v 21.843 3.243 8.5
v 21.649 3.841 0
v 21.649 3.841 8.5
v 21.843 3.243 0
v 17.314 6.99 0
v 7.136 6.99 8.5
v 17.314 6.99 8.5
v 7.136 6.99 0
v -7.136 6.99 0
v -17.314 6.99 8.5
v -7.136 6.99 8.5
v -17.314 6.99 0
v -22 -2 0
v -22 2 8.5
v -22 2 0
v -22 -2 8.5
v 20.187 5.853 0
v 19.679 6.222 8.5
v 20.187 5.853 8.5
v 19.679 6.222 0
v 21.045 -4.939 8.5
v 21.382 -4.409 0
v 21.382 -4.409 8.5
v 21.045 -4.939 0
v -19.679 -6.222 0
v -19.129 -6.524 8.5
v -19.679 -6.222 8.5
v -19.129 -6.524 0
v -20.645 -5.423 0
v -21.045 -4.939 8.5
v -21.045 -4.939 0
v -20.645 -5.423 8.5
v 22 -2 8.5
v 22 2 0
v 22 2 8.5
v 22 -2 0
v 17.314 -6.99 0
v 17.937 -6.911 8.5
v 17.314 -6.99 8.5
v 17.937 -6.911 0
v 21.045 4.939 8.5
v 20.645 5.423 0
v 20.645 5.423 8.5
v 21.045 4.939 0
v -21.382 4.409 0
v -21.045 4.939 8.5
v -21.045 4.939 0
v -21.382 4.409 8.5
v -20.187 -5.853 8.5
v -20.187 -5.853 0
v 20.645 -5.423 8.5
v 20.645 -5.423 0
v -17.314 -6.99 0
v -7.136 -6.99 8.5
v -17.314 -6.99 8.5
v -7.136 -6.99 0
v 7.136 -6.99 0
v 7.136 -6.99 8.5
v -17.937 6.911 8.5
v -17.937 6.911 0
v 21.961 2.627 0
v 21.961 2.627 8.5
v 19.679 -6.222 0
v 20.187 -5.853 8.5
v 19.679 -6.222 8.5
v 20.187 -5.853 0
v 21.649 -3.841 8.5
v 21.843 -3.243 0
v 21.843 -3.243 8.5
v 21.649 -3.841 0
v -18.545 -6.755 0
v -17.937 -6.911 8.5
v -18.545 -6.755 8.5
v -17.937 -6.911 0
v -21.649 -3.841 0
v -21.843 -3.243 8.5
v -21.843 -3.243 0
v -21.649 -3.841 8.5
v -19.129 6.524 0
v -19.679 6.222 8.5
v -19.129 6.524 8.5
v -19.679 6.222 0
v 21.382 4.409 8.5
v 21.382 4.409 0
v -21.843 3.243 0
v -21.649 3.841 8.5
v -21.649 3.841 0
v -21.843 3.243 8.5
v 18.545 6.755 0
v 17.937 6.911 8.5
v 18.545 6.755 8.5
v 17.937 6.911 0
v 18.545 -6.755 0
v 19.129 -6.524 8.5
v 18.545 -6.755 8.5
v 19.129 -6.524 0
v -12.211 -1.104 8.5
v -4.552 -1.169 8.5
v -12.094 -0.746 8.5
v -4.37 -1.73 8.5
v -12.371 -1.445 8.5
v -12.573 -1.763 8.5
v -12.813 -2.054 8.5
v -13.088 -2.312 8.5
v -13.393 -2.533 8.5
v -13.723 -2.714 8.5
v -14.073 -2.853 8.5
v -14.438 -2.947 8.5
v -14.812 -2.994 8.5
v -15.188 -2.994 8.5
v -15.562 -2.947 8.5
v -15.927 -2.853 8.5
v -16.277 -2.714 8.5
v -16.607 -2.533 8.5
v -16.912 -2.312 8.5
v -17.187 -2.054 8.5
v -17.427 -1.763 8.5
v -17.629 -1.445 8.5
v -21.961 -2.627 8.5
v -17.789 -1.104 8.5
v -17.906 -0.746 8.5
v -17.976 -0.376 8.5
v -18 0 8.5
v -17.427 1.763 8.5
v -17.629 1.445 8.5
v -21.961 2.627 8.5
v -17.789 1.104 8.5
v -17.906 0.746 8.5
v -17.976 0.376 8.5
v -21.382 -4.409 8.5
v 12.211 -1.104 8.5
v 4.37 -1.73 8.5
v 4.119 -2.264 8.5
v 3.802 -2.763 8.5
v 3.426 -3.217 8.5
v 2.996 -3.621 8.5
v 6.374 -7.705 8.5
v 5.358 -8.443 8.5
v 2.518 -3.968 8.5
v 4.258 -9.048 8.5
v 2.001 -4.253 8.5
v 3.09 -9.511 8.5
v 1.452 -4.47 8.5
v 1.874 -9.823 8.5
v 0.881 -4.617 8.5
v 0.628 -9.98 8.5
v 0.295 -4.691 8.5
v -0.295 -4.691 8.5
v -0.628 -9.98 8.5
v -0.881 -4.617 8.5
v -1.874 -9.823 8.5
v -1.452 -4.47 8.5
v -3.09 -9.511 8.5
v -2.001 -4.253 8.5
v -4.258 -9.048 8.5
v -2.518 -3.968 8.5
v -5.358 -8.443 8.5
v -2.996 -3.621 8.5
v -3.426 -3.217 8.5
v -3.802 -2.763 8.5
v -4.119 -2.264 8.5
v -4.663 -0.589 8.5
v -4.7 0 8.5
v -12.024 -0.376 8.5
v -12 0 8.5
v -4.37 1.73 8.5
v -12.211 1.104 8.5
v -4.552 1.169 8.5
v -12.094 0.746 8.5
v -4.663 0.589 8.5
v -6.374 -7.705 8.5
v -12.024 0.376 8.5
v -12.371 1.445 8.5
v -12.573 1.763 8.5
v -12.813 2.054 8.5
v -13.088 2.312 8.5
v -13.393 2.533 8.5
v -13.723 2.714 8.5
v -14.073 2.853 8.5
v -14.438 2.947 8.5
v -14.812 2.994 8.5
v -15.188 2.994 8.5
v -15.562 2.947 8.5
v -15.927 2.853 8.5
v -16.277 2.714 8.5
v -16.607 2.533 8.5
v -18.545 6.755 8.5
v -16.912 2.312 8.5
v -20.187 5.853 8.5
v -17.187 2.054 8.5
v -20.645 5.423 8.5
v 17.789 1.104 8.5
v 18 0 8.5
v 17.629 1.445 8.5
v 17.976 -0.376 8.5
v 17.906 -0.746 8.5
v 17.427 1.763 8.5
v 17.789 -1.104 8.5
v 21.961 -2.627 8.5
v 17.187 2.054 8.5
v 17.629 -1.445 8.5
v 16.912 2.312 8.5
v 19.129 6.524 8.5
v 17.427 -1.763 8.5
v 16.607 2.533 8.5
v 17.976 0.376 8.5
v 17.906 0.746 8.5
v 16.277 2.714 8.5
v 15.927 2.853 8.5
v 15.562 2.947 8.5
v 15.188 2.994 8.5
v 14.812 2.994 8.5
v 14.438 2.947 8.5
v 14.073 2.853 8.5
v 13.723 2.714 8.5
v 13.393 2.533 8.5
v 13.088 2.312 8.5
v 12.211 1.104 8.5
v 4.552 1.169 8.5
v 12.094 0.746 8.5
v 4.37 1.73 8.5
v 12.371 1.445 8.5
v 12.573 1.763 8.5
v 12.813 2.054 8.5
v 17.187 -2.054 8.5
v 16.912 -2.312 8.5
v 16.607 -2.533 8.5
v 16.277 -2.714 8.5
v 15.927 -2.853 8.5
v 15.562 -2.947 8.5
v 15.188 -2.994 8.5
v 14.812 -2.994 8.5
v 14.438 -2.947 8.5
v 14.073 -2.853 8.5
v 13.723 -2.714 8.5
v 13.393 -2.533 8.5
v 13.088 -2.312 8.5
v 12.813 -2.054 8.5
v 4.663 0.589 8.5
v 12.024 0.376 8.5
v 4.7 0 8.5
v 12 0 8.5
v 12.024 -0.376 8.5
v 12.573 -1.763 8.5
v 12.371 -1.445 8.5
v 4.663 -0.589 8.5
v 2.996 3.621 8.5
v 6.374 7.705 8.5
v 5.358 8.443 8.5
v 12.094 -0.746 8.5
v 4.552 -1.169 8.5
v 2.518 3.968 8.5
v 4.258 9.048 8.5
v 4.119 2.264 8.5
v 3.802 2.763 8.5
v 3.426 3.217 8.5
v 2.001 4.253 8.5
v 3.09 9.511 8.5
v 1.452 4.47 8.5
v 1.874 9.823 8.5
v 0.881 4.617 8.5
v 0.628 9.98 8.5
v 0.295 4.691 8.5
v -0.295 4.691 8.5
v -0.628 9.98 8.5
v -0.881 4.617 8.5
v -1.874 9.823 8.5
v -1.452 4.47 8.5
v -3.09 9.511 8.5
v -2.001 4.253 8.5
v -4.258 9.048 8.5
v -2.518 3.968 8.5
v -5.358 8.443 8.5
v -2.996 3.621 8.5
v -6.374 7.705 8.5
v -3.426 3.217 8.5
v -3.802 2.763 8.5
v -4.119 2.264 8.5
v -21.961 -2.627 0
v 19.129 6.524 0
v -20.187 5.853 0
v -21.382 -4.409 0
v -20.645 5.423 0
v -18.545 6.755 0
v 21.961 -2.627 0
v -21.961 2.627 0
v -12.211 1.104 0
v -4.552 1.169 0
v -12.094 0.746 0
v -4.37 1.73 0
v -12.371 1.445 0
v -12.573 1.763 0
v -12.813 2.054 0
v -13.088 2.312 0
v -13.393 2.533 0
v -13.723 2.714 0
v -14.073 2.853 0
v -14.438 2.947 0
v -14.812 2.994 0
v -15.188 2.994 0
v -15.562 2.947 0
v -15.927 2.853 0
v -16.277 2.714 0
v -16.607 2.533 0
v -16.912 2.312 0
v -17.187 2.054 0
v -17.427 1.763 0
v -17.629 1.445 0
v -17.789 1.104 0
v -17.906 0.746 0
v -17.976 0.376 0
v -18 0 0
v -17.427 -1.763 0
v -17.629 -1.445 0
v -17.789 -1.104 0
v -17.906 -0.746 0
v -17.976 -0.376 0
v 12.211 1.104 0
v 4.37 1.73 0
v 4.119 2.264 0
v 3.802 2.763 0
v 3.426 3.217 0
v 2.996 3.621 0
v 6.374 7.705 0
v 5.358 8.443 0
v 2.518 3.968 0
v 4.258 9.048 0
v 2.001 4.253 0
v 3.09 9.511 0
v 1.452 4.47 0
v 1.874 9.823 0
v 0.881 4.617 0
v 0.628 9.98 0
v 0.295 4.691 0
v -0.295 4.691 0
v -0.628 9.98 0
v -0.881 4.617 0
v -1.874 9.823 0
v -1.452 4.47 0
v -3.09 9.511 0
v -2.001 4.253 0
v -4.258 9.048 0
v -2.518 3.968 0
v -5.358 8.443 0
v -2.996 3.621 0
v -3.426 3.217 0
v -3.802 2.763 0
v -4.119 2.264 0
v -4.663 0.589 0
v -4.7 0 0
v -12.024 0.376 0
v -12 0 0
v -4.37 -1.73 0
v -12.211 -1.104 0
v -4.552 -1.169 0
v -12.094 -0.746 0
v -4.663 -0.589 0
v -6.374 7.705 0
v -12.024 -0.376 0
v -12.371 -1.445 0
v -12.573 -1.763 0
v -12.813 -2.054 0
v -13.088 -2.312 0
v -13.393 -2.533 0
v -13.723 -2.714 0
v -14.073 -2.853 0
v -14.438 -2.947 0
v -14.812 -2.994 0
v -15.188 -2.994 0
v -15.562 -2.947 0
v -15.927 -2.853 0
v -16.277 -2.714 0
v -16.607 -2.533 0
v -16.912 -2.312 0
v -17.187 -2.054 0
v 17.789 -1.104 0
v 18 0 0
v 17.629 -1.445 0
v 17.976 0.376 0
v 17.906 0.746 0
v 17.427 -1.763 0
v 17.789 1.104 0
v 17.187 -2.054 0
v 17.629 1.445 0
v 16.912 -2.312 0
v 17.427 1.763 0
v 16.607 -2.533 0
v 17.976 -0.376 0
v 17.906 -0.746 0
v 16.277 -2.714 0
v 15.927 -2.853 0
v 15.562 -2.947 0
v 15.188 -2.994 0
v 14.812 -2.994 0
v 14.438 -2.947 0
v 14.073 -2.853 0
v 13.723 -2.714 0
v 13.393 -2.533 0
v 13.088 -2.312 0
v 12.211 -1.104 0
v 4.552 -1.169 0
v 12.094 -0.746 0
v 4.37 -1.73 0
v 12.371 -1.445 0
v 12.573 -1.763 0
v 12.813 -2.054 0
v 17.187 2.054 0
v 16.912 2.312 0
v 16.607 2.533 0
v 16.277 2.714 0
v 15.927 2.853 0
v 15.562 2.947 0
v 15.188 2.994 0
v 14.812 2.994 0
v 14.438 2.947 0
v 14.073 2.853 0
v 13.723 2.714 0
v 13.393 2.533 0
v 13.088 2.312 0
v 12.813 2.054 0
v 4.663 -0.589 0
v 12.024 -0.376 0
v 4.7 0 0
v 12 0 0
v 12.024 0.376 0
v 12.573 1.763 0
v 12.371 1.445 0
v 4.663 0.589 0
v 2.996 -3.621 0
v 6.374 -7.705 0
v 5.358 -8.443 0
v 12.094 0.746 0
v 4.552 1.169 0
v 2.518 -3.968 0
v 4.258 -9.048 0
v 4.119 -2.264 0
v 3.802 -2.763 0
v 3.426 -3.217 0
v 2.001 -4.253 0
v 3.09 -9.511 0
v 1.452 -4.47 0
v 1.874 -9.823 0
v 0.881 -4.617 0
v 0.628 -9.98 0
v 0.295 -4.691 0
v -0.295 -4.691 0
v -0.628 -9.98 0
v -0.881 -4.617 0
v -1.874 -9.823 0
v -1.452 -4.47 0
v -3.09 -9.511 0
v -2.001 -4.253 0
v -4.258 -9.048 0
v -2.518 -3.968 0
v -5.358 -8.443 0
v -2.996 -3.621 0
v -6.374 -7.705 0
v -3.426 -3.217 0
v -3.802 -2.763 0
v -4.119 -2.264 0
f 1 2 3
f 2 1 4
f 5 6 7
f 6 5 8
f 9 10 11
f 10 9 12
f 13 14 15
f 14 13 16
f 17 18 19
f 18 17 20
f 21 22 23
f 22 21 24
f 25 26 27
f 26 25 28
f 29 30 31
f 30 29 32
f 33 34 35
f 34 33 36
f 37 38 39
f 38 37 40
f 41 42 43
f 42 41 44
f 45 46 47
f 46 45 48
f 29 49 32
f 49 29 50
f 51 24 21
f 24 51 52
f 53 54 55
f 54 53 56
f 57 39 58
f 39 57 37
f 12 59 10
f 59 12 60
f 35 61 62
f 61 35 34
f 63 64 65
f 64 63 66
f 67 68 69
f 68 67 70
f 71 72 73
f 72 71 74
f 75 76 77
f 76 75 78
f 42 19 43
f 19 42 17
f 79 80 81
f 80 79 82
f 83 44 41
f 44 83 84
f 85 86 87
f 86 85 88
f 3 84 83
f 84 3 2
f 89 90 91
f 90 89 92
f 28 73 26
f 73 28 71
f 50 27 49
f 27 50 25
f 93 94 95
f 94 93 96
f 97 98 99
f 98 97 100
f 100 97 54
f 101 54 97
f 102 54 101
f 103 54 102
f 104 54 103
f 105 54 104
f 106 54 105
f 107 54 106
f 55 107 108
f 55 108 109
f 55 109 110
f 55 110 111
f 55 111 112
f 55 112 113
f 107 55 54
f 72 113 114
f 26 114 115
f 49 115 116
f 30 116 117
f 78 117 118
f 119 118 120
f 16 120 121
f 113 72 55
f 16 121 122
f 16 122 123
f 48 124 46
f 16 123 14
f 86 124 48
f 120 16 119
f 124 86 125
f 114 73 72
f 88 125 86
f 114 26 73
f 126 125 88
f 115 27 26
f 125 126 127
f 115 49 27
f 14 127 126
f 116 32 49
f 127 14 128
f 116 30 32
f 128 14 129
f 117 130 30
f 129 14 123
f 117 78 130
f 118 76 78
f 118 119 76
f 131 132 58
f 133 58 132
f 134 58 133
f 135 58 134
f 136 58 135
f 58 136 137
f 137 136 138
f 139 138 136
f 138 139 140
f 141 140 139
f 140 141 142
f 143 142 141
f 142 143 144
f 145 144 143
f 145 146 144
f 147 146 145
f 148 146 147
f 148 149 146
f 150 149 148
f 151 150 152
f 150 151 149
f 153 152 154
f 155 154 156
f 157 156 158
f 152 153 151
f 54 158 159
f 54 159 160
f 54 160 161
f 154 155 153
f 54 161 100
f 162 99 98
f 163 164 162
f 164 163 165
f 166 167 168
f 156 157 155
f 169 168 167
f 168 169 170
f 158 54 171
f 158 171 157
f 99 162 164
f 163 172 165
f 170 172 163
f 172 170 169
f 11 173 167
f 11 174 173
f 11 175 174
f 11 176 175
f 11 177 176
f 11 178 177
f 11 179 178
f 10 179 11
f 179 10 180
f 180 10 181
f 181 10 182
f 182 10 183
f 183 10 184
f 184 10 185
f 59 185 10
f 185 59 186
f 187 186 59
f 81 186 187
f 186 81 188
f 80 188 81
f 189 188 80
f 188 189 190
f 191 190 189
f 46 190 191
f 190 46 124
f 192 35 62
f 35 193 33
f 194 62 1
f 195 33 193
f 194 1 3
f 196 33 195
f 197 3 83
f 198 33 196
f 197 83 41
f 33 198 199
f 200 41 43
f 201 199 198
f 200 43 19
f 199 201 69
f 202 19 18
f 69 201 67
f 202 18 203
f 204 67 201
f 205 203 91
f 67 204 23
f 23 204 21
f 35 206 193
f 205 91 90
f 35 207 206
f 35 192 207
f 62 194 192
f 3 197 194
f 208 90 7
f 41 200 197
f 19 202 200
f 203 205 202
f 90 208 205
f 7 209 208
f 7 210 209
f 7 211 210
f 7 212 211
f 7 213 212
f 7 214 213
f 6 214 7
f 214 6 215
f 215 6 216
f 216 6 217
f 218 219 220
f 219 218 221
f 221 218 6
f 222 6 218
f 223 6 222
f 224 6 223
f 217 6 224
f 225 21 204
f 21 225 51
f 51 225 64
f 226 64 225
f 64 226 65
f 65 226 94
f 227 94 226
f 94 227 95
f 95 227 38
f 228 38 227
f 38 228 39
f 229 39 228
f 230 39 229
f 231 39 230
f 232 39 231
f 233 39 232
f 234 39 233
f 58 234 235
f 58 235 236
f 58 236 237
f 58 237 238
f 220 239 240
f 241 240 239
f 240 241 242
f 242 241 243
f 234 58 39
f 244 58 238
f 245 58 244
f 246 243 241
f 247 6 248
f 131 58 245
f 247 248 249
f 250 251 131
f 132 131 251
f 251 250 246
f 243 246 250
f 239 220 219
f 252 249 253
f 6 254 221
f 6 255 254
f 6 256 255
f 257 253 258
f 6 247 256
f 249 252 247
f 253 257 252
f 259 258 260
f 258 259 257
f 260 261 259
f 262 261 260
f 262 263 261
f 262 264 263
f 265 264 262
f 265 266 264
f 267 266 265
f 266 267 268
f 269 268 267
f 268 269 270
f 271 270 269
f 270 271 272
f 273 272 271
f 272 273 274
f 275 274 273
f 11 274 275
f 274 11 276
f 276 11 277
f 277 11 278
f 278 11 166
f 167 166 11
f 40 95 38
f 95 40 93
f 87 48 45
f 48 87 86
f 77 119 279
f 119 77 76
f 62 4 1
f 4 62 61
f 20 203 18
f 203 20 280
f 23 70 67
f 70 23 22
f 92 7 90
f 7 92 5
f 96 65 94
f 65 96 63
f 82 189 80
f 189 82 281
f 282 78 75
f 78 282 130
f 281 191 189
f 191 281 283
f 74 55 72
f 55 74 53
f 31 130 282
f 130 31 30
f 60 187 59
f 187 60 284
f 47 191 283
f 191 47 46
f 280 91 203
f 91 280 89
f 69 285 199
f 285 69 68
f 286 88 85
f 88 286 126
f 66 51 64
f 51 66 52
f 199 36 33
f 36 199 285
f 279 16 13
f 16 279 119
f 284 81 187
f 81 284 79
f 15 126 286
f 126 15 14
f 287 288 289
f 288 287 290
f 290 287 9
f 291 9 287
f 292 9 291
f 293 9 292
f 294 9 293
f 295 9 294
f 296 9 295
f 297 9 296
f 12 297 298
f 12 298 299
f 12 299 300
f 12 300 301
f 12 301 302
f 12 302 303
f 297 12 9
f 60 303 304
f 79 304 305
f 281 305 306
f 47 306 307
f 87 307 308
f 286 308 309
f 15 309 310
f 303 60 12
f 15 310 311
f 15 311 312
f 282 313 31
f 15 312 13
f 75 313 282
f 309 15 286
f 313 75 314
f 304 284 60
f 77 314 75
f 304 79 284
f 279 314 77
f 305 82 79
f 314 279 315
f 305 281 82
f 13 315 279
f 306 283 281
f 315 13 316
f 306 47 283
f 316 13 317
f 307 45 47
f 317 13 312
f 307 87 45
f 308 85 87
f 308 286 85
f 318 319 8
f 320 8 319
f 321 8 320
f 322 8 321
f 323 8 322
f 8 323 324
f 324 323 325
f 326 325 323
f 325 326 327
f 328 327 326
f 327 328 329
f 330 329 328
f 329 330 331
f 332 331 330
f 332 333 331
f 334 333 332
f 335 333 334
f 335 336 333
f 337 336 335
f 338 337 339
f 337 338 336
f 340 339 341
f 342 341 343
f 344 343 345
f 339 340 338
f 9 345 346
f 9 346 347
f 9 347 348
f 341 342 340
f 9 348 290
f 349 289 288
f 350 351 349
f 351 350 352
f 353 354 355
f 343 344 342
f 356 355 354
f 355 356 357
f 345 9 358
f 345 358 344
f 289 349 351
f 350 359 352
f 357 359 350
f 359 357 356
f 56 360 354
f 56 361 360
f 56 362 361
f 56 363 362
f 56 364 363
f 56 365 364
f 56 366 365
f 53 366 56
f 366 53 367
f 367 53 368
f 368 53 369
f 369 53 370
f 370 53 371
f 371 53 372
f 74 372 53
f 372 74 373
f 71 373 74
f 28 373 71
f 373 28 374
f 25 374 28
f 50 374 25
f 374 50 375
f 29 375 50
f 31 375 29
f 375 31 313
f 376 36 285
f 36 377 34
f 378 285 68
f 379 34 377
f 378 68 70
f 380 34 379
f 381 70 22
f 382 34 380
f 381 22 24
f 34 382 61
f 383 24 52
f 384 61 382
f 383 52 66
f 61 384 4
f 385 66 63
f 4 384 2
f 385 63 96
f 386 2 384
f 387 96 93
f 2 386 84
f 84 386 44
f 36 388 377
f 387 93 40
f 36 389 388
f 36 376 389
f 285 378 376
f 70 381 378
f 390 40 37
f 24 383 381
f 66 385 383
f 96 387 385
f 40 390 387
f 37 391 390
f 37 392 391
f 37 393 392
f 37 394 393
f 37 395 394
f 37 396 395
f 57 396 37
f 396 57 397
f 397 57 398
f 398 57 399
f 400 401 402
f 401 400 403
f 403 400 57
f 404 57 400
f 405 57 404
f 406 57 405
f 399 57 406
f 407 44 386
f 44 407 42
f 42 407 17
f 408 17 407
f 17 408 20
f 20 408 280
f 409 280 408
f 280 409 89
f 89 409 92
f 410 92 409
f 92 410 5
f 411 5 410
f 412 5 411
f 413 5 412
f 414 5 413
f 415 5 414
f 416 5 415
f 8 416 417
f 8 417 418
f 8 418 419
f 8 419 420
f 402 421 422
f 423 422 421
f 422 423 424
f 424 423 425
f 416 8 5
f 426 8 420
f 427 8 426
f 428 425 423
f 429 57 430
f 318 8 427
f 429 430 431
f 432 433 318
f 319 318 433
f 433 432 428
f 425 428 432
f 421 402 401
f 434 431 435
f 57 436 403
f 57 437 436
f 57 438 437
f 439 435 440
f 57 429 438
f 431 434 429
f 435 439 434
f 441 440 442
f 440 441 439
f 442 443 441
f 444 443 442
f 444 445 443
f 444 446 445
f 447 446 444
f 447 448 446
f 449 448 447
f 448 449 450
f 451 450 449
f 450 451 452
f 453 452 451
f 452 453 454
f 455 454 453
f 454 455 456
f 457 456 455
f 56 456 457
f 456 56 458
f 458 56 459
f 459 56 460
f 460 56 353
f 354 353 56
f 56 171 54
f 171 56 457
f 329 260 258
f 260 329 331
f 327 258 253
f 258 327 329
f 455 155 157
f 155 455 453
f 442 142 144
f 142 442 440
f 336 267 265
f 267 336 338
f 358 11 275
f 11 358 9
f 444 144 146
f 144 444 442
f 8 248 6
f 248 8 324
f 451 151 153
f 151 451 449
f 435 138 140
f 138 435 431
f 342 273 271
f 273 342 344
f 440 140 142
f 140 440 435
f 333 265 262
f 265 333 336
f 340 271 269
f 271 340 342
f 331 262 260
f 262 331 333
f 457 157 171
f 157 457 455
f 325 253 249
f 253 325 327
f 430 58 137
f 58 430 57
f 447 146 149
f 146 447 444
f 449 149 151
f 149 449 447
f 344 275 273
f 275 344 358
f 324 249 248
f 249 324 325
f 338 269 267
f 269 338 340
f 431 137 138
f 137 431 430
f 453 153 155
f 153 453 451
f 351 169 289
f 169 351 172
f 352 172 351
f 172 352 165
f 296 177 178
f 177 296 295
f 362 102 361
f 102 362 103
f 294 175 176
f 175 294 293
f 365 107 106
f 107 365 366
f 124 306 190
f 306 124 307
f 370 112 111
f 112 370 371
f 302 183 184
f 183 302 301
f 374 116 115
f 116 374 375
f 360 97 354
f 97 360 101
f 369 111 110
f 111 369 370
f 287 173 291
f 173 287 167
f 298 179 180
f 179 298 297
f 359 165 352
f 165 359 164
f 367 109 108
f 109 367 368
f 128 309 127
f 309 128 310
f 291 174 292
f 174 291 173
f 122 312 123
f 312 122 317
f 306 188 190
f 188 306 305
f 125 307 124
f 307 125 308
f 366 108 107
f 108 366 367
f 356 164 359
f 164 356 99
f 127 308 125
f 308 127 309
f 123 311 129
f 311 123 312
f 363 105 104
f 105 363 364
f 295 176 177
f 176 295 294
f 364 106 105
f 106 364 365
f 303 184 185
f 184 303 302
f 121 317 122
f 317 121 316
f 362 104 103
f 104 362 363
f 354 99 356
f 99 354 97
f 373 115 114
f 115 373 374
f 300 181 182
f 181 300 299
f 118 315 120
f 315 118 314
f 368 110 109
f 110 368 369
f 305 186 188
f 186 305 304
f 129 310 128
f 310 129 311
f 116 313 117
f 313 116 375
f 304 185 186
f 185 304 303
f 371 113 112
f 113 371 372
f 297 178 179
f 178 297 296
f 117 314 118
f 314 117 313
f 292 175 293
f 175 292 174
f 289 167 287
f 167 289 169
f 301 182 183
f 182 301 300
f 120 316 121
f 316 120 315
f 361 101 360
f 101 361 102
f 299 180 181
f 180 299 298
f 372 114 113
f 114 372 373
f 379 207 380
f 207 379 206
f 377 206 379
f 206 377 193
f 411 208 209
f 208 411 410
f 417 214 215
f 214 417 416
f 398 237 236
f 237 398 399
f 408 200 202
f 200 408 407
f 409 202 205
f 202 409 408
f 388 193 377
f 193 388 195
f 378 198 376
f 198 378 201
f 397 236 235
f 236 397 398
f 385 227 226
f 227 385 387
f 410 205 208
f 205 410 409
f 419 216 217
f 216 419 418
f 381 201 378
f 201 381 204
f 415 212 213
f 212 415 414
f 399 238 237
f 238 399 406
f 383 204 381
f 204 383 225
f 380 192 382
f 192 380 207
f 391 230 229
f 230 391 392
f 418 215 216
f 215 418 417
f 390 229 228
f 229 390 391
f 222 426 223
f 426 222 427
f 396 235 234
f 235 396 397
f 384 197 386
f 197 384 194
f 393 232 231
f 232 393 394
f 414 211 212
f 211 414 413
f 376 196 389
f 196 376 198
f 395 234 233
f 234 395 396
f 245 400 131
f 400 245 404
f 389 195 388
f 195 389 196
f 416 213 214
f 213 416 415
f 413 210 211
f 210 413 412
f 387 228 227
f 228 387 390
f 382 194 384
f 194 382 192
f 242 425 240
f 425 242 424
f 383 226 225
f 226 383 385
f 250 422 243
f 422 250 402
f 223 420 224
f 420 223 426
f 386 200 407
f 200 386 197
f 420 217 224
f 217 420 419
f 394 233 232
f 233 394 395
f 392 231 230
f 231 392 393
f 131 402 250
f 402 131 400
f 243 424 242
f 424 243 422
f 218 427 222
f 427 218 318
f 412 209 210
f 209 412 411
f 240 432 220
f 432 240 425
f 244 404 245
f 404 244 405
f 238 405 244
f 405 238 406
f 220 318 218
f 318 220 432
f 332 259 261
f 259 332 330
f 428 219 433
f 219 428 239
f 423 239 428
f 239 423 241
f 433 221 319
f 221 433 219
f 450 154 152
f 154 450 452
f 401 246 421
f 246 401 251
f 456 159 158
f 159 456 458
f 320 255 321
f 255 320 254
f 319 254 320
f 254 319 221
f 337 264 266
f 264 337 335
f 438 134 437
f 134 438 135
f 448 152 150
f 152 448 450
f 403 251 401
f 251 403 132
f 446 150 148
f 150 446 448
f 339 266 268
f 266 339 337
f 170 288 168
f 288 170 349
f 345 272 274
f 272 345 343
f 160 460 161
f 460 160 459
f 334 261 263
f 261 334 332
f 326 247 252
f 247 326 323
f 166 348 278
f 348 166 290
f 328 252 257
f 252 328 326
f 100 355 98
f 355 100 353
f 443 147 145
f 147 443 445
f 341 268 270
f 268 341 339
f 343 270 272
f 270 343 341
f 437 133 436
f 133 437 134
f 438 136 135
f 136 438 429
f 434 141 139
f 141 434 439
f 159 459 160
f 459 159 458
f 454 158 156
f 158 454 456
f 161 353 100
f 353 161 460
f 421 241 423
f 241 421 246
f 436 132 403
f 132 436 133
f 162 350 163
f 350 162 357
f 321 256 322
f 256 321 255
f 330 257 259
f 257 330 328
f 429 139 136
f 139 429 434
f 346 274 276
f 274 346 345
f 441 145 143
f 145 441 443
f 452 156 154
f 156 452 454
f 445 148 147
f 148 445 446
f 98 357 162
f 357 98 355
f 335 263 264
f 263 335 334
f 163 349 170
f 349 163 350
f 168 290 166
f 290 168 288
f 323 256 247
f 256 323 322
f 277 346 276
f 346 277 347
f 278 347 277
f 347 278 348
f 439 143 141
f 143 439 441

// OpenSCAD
$fn = 50;


difference() {
	union() {
		translate(v = [0, 0, 0]) {
			rotate(a = [0, 0, 0]) {
				hull() {
					translate(v = [-17.0000000000, 2.0000000000, 0]) {
						rotate(a = [0, 0, 0]) {
							translate(v = [0, 0, 0]) {
								rotate(a = [0, 0, 0]) {
									cylinder(h = 8.5000000000, r = 5);
								}
							}
						}
					}
					translate(v = [17.0000000000, 2.0000000000, 0]) {
						rotate(a = [0, 0, 0]) {
							translate(v = [0, 0, 0]) {
								rotate(a = [0, 0, 0]) {
									cylinder(h = 8.5000000000, r = 5);
								}
							}
						}
					}
					translate(v = [-17.0000000000, -2.0000000000, 0]) {
						rotate(a = [0, 0, 0]) {
							translate(v = [0, 0, 0]) {
								rotate(a = [0, 0, 0]) {
									cylinder(h = 8.5000000000, r = 5);
								}
							}
						}
					}
					translate(v = [17.0000000000, -2.0000000000, 0]) {
						rotate(a = [0, 0, 0]) {
							translate(v = [0, 0, 0]) {
								rotate(a = [0, 0, 0]) {
									cylinder(h = 8.5000000000, r = 5);
								}
							}
						}
					}
				}
			}
		}
		translate(v = [0, 0, 0.0000000000]) {
			rotate(a = [0, 0, 0]) {
				cylinder(h = 8.5000000000, r = 10.0000000000);
			}
		}
	}
	union() {
		translate(v = [-15.0000000000, 0.0000000000, 0]) {
			rotate(a = [0, 0, 0]) {
				translate(v = [0, 0, -50]) {
					rotate(a = [0, 0, 0]) {
						cylinder(h = 100, r = 3.0000000000);
					}
				}
			}
		}
		translate(v = [0.0000000000, 0.0000000000, 0]) {
			rotate(a = [0, 0, 0]) {
				translate(v = [0, 0, -50]) {
					rotate(a = [0, 0, 0]) {
						cylinder(h = 100, r = 3.0000000000);
					}
				}
			}
		}
		translate(v = [15.0000000000, 0.0000000000, 0]) {
			rotate(a = [0, 0, 0]) {
				translate(v = [0, 0, -50]) {
					rotate(a = [0, 0, 0]) {
						cylinder(h = 100, r = 3.0000000000);
					}
				}
			}
		}
		translate(v = [0, 0, -125.0000000000]) {
			rotate(a = [0, 0, 0]) {
				cylinder(h = 250, r = 4.7000000000);
			}
		}
	}
}
